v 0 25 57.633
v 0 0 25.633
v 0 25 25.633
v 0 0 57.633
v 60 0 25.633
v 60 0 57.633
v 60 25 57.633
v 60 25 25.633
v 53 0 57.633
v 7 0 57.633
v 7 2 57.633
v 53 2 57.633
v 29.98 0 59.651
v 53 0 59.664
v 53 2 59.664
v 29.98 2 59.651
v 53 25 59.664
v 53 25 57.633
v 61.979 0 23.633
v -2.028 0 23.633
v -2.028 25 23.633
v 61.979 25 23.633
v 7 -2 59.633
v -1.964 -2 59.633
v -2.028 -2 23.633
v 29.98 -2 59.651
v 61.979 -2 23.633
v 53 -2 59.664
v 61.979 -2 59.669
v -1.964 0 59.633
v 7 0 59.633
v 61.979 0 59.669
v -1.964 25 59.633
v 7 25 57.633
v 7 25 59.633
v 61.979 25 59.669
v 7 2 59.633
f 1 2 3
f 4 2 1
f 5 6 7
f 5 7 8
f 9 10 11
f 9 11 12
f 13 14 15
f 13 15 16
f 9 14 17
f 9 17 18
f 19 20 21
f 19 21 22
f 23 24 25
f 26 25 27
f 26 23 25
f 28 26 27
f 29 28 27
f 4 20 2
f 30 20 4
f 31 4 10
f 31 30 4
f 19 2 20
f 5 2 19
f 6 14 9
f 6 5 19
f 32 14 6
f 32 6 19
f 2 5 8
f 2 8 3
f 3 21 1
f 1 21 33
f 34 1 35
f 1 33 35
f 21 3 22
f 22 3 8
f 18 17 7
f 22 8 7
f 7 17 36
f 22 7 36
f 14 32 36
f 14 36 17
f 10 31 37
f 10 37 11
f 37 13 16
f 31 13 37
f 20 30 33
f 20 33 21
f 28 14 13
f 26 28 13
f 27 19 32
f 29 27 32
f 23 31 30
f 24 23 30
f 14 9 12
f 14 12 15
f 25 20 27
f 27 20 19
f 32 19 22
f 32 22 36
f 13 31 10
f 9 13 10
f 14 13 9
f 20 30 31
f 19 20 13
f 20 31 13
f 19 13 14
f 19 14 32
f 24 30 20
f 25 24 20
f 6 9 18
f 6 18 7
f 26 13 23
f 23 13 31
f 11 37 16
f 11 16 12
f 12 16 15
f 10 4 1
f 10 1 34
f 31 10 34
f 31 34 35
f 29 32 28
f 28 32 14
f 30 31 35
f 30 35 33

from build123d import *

# Parameters (mm, degrees)
F1_DEPTH = 2
F2_DEPTH = 2
F3_DEPTH = 25


with BuildPart() as f1:
    # F0 (on Front) → F1 (new body)
    with BuildSketch(Plane.XZ):
        Polygon((7, 59.633072), (7, 57.633072), (53, 57.633072), (53, 59.663545), (29.980112, 59.650782), align=None)
    extrude(amount=-F1_DEPTH)


with BuildPart() as f2:
    # F0 (on Front) → F2 (new body)
    with BuildSketch(Plane.XZ):
        Polygon((60, 25.633072), (0, 25.633072), (0, 57.633072), (7, 57.633072), (7, 59.633072), (-1.963923, 59.633072), (-2.028268, 23.633072), (61.979439, 23.633072), (61.979439, 59.668523), (53, 59.663545), (53, 57.633072), (60, 57.633072), align=None)
        Polygon((7, 59.633072), (7, 57.633072), (53, 57.633072), (53, 59.663545), (29.980112, 59.650782), align=None)
        Polygon((0, 57.633072), (0, 25.633072), (60, 25.633072), (60, 57.633072), (53, 57.633072), (7, 57.633072), align=None)
    extrude(amount=F2_DEPTH)


with BuildPart() as f3:
    # F0 (on Front) → F3 (new body)
    with BuildSketch(Plane.XZ):
        Polygon((60, 25.633072), (0, 25.633072), (0, 57.633072), (7, 57.633072), (7, 59.633072), (-1.963923, 59.633072), (-2.028268, 23.633072), (61.979439, 23.633072), (61.979439, 59.668523), (53, 59.663545), (53, 57.633072), (60, 57.633072), align=None)
    extrude(amount=-F3_DEPTH)


solid = Compound([f1.part, f2.part, f3.part])
